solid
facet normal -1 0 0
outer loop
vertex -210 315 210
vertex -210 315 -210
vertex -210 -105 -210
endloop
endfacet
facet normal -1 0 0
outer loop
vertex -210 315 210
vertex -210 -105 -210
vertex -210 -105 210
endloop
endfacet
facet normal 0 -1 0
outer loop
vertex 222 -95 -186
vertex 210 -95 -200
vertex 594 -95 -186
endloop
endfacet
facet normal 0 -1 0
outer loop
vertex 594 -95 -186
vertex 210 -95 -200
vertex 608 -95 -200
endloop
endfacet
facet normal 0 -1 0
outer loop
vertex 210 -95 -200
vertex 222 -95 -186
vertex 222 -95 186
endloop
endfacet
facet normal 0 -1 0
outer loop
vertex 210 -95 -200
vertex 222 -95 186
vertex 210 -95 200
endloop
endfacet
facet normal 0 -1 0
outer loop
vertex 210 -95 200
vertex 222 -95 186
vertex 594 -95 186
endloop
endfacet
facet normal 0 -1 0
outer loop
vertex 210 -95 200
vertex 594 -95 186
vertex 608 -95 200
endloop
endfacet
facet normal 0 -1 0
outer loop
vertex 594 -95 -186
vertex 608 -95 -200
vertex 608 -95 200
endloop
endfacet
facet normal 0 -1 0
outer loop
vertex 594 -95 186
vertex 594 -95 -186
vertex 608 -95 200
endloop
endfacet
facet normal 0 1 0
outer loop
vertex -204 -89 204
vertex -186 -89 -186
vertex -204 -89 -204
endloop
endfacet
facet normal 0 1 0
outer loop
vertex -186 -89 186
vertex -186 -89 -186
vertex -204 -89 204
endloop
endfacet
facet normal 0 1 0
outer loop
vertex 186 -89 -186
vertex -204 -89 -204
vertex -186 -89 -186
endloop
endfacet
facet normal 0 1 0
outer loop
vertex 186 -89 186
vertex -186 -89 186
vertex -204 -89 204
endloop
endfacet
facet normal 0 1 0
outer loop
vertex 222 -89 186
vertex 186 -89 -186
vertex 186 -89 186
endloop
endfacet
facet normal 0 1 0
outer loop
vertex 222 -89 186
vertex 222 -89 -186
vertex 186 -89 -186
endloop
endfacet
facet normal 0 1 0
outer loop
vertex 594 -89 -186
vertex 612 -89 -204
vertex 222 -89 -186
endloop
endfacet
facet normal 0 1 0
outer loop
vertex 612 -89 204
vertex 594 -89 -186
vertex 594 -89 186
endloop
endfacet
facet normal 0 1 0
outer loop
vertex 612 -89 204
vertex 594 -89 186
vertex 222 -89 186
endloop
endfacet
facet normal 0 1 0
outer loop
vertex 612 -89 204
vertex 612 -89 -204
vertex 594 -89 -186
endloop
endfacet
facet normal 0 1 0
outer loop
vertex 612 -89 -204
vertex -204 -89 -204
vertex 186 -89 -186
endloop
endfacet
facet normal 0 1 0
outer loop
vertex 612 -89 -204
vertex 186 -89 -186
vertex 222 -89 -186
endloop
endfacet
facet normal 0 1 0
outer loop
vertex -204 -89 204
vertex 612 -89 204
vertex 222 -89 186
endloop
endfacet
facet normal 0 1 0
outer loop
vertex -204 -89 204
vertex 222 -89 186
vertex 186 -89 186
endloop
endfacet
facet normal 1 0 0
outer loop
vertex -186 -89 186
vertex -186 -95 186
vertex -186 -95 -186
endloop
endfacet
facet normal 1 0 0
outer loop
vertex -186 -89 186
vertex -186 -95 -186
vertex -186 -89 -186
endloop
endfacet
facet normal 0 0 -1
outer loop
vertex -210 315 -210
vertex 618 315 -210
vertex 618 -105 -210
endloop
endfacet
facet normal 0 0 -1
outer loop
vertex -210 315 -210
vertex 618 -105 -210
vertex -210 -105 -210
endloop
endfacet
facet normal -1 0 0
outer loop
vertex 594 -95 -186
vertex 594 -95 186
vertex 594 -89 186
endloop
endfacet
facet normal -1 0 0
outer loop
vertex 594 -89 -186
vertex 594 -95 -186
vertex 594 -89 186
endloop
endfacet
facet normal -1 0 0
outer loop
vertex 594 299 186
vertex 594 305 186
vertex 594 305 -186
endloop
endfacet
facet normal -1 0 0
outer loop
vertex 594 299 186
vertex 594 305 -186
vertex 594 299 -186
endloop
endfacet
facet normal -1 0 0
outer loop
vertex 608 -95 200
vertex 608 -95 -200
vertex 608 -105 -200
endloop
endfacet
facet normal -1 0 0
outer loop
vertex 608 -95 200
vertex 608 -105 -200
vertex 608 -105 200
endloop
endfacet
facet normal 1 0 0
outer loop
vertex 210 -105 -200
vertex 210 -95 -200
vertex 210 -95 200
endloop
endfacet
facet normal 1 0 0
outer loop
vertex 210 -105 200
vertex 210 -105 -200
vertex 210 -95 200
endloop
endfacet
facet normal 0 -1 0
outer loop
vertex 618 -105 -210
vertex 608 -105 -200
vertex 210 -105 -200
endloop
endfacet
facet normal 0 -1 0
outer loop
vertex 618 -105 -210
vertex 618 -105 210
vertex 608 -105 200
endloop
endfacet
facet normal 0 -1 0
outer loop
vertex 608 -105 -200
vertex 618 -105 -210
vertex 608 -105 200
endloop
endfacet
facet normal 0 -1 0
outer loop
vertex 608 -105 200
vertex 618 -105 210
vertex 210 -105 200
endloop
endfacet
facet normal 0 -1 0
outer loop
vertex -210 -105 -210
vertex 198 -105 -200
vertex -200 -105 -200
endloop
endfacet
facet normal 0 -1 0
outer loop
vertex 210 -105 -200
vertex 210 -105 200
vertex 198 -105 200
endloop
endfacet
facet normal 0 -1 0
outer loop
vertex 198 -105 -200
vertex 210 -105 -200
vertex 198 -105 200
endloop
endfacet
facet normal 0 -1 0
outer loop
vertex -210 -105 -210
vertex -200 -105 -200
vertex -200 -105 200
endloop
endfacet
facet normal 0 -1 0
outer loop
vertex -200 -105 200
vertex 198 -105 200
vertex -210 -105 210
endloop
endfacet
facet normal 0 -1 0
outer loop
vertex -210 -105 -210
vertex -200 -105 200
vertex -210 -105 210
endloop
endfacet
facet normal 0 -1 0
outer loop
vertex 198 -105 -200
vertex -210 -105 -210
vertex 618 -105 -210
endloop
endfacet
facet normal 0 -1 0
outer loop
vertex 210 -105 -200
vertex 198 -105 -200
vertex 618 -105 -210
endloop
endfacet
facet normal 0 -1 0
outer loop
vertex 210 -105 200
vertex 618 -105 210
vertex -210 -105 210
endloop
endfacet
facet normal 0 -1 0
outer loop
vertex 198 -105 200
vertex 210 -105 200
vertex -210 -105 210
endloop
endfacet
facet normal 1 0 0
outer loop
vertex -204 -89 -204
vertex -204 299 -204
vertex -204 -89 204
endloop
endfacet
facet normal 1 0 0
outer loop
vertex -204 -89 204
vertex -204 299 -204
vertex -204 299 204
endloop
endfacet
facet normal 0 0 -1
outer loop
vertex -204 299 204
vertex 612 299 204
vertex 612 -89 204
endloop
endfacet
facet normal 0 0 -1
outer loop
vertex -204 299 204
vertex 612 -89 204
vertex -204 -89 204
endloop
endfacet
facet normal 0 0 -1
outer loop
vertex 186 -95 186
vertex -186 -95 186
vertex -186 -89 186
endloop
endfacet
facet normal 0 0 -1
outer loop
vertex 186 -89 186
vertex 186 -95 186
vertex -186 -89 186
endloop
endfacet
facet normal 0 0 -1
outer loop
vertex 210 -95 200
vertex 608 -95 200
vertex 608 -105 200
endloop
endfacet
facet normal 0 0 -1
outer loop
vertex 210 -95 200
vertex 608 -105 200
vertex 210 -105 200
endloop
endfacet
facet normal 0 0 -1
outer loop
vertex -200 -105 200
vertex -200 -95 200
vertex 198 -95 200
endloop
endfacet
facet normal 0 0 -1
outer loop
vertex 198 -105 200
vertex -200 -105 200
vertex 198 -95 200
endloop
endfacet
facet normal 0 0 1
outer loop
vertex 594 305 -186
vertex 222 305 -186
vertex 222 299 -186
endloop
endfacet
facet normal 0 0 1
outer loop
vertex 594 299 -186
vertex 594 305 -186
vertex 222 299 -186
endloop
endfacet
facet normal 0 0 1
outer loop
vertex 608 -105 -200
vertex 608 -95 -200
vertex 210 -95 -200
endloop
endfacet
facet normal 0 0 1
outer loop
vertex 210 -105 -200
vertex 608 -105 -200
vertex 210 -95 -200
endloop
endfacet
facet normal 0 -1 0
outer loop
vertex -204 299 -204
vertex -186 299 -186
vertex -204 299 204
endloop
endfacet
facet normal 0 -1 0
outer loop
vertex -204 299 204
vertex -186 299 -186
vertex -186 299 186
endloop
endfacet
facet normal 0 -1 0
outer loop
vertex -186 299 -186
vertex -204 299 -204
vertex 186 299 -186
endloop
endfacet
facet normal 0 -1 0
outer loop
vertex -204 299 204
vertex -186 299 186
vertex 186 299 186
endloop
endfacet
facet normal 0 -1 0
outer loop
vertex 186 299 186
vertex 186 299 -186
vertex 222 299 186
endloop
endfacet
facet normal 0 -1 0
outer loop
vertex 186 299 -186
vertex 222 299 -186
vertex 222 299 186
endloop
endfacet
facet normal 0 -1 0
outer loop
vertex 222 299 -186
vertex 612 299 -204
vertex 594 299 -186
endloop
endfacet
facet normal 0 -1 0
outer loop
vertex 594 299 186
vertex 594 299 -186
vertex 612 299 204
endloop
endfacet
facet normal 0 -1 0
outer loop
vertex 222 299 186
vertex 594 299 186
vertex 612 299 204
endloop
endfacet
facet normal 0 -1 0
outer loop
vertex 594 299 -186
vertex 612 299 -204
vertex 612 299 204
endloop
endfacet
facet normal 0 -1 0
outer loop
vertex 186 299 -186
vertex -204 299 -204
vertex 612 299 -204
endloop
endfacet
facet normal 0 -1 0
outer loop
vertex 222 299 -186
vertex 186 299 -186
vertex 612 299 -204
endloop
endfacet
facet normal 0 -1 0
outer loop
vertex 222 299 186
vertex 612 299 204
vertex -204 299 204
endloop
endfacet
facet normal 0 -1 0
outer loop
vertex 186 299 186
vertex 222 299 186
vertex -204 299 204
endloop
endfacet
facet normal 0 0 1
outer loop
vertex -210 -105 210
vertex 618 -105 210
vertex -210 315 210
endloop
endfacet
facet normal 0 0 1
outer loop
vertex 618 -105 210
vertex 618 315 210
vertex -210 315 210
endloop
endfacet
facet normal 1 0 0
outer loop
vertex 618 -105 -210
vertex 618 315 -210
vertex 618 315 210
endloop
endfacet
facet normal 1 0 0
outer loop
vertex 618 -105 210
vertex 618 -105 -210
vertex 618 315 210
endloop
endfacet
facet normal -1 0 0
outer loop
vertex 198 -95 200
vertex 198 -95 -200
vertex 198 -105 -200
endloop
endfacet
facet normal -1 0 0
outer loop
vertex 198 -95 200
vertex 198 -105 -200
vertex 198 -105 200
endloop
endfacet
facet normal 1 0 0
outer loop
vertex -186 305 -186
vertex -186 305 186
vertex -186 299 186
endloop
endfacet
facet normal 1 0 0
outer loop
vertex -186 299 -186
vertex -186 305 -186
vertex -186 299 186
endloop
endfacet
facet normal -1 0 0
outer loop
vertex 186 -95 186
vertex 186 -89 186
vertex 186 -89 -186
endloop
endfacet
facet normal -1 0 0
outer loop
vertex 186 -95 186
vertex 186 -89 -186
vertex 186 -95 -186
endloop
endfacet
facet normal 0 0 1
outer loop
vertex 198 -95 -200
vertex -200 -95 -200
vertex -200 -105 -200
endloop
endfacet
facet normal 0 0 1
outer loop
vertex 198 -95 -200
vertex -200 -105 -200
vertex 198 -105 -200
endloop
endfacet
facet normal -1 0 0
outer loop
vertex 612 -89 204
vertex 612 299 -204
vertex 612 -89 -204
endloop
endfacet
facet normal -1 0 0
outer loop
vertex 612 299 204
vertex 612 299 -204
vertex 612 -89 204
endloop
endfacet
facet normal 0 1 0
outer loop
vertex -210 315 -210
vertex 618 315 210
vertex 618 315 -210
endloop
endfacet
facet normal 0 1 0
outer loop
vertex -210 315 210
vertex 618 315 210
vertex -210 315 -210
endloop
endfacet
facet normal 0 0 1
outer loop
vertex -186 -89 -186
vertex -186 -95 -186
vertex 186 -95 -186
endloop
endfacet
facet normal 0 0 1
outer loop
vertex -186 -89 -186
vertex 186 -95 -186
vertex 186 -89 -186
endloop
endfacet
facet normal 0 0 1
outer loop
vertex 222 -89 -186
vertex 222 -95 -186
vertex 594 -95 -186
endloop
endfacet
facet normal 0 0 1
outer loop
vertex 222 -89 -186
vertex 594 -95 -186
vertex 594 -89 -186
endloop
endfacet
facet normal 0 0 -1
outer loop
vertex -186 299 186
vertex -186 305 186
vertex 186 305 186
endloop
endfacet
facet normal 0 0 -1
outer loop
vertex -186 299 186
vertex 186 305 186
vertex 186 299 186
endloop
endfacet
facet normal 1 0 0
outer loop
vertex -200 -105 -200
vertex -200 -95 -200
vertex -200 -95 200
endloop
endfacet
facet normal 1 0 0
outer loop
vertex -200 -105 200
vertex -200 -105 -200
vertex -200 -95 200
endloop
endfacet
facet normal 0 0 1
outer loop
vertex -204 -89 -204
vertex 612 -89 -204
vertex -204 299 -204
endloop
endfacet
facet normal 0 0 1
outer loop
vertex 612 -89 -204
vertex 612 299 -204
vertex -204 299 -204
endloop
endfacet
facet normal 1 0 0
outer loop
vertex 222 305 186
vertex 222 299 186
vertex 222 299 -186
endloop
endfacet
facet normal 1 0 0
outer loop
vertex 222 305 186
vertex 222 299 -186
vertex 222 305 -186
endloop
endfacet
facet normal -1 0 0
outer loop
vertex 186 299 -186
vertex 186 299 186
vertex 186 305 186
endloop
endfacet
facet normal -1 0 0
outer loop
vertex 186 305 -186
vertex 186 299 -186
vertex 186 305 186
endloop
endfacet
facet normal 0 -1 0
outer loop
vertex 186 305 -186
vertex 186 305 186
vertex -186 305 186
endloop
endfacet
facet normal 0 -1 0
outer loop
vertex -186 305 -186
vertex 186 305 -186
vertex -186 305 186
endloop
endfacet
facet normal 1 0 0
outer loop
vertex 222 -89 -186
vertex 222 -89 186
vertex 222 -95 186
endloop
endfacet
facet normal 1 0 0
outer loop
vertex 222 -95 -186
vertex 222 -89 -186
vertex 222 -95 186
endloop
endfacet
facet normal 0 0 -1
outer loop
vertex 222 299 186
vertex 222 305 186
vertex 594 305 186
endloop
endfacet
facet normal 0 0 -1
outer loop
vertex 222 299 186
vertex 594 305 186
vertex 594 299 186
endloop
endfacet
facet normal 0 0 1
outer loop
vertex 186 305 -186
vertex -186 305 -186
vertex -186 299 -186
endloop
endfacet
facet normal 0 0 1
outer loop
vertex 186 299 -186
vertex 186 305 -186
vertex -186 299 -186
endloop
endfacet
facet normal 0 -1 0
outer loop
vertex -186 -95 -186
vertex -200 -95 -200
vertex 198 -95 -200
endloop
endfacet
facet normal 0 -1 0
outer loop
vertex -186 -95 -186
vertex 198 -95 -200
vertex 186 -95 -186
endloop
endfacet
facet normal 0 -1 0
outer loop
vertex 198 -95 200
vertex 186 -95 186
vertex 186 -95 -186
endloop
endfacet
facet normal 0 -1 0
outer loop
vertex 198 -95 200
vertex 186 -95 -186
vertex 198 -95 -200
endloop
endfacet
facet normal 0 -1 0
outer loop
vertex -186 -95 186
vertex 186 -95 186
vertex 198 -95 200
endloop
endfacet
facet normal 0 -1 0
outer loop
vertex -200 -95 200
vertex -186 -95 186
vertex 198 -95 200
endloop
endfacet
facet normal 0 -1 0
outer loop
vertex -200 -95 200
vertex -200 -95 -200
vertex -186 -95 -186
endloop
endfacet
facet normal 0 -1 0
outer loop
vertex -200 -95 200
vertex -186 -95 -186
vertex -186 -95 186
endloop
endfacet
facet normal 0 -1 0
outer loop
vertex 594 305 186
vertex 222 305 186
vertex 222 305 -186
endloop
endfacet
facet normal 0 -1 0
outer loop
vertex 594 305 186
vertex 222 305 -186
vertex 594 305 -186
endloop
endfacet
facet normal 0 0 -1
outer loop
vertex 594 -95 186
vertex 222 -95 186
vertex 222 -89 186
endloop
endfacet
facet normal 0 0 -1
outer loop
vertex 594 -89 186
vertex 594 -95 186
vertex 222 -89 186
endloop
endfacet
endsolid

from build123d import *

# Parameters (mm, degrees)
F0_W      = 420
F0_H      = 420
F1_DEPTH  = 105
F2_T      = -6
F3_W      = 6
F3_H      = 408
F4_DEPTH  = 18
F5_W      = 6
F5_H      = 408
F6_DEPTH  = 18
F7_W      = 6
F7_H      = 18
F8_DEPTH  = 372
F9_W      = 6
F9_H      = 18
F10_DEPTH = 372
F11_W     = 408
F11_H     = 408
F11_W_2   = 400
F11_H_2   = 400
F12_DEPTH = 10
F14_DEPTH = 25.4
F15_W     = 400
F15_H     = 400
F16_DEPTH = 10
F18_DEPTH = 25.4


with BuildPart() as f1:
    # F0 (on Front) → F1 (new body, symmetric)
    with BuildSketch(Plane.XZ):
        Rectangle(F0_W, F0_H)
    extrude(amount=F1_DEPTH, both=True)

    # F2
    f2_openings = [f1.faces().sort_by_distance(p)[0] for p in [
        (0, -105, 0),
    ]]
    offset(amount=F2_T, openings=f2_openings)

    # F3 (on face) → F4 (join)
    with BuildSketch(Plane.YZ.offset(-204)):
        with Locations((-92, 0)):
            Rectangle(F3_W, F3_H)
    extrude(amount=F4_DEPTH)

    # F5 (on face) → F6 (join)
    with BuildSketch(Plane(origin=(204, 0, 0), x_dir=(0, -1, 0), z_dir=(-1, 0, 0))):
        with Locations((92, 0)):
            Rectangle(F5_W, F5_H)
    extrude(amount=F6_DEPTH)

    # F7 (on face) → F8 (join, through all)
    with BuildSketch(Plane.YZ.offset(-186)):
        with Locations((-92, 195)):
            Rectangle(F7_W, F7_H)
    extrude(amount=F8_DEPTH)

    # F9 (on face) → F10 (join, through all)
    with BuildSketch(Plane.YZ.offset(-186)):
        with Locations((-92, -195)):
            Rectangle(F9_W, F9_H)
    extrude(amount=F10_DEPTH)

    # F11 (on face) → F12 (join)
    with BuildSketch(Plane.XZ.offset(95)):
        Rectangle(F11_W, F11_H)
        Rectangle(F11_W_2, F11_H_2, mode=Mode.SUBTRACT)
    extrude(amount=F12_DEPTH)

    # F13: F1 across face


with BuildPart() as f1_1:
    add(f1.part)
    add(f1.part.mirror(Plane(origin=(0, 105, 0), x_dir=(1, 0, 0), z_dir=(0, 1, 0))))

    # F14 (cut): a face of the model
    f14_faces = [f1_1.faces().sort_by_distance(p)[0] for p in [
        (0, 111, 0),
    ]]
    extrude(f14_faces, amount=-F14_DEPTH, mode=Mode.SUBTRACT)

    # F15 (on face) → F16 (join)
    with BuildSketch(Plane(origin=(0, 305, 0), x_dir=(-1, 0, 0), z_dir=(0, 1, 0))):
        Rectangle(F15_W, F15_H)
    extrude(amount=F16_DEPTH)

    # F17: F1 across face


with BuildPart() as f1_2:
    add(f1_1.part)
    add(f1_1.part.mirror(Plane(origin=(204, 105, 0), x_dir=(0, -1, 0), z_dir=(-1, 0, 0))))

    # F18 (cut): a face of the model
    f18_faces = [f1_2.faces().sort_by_distance(p)[0] for p in [
        (198, 105, 0),
    ]]
    extrude(f18_faces, amount=-F18_DEPTH, mode=Mode.SUBTRACT)


solid = f1_2.part
